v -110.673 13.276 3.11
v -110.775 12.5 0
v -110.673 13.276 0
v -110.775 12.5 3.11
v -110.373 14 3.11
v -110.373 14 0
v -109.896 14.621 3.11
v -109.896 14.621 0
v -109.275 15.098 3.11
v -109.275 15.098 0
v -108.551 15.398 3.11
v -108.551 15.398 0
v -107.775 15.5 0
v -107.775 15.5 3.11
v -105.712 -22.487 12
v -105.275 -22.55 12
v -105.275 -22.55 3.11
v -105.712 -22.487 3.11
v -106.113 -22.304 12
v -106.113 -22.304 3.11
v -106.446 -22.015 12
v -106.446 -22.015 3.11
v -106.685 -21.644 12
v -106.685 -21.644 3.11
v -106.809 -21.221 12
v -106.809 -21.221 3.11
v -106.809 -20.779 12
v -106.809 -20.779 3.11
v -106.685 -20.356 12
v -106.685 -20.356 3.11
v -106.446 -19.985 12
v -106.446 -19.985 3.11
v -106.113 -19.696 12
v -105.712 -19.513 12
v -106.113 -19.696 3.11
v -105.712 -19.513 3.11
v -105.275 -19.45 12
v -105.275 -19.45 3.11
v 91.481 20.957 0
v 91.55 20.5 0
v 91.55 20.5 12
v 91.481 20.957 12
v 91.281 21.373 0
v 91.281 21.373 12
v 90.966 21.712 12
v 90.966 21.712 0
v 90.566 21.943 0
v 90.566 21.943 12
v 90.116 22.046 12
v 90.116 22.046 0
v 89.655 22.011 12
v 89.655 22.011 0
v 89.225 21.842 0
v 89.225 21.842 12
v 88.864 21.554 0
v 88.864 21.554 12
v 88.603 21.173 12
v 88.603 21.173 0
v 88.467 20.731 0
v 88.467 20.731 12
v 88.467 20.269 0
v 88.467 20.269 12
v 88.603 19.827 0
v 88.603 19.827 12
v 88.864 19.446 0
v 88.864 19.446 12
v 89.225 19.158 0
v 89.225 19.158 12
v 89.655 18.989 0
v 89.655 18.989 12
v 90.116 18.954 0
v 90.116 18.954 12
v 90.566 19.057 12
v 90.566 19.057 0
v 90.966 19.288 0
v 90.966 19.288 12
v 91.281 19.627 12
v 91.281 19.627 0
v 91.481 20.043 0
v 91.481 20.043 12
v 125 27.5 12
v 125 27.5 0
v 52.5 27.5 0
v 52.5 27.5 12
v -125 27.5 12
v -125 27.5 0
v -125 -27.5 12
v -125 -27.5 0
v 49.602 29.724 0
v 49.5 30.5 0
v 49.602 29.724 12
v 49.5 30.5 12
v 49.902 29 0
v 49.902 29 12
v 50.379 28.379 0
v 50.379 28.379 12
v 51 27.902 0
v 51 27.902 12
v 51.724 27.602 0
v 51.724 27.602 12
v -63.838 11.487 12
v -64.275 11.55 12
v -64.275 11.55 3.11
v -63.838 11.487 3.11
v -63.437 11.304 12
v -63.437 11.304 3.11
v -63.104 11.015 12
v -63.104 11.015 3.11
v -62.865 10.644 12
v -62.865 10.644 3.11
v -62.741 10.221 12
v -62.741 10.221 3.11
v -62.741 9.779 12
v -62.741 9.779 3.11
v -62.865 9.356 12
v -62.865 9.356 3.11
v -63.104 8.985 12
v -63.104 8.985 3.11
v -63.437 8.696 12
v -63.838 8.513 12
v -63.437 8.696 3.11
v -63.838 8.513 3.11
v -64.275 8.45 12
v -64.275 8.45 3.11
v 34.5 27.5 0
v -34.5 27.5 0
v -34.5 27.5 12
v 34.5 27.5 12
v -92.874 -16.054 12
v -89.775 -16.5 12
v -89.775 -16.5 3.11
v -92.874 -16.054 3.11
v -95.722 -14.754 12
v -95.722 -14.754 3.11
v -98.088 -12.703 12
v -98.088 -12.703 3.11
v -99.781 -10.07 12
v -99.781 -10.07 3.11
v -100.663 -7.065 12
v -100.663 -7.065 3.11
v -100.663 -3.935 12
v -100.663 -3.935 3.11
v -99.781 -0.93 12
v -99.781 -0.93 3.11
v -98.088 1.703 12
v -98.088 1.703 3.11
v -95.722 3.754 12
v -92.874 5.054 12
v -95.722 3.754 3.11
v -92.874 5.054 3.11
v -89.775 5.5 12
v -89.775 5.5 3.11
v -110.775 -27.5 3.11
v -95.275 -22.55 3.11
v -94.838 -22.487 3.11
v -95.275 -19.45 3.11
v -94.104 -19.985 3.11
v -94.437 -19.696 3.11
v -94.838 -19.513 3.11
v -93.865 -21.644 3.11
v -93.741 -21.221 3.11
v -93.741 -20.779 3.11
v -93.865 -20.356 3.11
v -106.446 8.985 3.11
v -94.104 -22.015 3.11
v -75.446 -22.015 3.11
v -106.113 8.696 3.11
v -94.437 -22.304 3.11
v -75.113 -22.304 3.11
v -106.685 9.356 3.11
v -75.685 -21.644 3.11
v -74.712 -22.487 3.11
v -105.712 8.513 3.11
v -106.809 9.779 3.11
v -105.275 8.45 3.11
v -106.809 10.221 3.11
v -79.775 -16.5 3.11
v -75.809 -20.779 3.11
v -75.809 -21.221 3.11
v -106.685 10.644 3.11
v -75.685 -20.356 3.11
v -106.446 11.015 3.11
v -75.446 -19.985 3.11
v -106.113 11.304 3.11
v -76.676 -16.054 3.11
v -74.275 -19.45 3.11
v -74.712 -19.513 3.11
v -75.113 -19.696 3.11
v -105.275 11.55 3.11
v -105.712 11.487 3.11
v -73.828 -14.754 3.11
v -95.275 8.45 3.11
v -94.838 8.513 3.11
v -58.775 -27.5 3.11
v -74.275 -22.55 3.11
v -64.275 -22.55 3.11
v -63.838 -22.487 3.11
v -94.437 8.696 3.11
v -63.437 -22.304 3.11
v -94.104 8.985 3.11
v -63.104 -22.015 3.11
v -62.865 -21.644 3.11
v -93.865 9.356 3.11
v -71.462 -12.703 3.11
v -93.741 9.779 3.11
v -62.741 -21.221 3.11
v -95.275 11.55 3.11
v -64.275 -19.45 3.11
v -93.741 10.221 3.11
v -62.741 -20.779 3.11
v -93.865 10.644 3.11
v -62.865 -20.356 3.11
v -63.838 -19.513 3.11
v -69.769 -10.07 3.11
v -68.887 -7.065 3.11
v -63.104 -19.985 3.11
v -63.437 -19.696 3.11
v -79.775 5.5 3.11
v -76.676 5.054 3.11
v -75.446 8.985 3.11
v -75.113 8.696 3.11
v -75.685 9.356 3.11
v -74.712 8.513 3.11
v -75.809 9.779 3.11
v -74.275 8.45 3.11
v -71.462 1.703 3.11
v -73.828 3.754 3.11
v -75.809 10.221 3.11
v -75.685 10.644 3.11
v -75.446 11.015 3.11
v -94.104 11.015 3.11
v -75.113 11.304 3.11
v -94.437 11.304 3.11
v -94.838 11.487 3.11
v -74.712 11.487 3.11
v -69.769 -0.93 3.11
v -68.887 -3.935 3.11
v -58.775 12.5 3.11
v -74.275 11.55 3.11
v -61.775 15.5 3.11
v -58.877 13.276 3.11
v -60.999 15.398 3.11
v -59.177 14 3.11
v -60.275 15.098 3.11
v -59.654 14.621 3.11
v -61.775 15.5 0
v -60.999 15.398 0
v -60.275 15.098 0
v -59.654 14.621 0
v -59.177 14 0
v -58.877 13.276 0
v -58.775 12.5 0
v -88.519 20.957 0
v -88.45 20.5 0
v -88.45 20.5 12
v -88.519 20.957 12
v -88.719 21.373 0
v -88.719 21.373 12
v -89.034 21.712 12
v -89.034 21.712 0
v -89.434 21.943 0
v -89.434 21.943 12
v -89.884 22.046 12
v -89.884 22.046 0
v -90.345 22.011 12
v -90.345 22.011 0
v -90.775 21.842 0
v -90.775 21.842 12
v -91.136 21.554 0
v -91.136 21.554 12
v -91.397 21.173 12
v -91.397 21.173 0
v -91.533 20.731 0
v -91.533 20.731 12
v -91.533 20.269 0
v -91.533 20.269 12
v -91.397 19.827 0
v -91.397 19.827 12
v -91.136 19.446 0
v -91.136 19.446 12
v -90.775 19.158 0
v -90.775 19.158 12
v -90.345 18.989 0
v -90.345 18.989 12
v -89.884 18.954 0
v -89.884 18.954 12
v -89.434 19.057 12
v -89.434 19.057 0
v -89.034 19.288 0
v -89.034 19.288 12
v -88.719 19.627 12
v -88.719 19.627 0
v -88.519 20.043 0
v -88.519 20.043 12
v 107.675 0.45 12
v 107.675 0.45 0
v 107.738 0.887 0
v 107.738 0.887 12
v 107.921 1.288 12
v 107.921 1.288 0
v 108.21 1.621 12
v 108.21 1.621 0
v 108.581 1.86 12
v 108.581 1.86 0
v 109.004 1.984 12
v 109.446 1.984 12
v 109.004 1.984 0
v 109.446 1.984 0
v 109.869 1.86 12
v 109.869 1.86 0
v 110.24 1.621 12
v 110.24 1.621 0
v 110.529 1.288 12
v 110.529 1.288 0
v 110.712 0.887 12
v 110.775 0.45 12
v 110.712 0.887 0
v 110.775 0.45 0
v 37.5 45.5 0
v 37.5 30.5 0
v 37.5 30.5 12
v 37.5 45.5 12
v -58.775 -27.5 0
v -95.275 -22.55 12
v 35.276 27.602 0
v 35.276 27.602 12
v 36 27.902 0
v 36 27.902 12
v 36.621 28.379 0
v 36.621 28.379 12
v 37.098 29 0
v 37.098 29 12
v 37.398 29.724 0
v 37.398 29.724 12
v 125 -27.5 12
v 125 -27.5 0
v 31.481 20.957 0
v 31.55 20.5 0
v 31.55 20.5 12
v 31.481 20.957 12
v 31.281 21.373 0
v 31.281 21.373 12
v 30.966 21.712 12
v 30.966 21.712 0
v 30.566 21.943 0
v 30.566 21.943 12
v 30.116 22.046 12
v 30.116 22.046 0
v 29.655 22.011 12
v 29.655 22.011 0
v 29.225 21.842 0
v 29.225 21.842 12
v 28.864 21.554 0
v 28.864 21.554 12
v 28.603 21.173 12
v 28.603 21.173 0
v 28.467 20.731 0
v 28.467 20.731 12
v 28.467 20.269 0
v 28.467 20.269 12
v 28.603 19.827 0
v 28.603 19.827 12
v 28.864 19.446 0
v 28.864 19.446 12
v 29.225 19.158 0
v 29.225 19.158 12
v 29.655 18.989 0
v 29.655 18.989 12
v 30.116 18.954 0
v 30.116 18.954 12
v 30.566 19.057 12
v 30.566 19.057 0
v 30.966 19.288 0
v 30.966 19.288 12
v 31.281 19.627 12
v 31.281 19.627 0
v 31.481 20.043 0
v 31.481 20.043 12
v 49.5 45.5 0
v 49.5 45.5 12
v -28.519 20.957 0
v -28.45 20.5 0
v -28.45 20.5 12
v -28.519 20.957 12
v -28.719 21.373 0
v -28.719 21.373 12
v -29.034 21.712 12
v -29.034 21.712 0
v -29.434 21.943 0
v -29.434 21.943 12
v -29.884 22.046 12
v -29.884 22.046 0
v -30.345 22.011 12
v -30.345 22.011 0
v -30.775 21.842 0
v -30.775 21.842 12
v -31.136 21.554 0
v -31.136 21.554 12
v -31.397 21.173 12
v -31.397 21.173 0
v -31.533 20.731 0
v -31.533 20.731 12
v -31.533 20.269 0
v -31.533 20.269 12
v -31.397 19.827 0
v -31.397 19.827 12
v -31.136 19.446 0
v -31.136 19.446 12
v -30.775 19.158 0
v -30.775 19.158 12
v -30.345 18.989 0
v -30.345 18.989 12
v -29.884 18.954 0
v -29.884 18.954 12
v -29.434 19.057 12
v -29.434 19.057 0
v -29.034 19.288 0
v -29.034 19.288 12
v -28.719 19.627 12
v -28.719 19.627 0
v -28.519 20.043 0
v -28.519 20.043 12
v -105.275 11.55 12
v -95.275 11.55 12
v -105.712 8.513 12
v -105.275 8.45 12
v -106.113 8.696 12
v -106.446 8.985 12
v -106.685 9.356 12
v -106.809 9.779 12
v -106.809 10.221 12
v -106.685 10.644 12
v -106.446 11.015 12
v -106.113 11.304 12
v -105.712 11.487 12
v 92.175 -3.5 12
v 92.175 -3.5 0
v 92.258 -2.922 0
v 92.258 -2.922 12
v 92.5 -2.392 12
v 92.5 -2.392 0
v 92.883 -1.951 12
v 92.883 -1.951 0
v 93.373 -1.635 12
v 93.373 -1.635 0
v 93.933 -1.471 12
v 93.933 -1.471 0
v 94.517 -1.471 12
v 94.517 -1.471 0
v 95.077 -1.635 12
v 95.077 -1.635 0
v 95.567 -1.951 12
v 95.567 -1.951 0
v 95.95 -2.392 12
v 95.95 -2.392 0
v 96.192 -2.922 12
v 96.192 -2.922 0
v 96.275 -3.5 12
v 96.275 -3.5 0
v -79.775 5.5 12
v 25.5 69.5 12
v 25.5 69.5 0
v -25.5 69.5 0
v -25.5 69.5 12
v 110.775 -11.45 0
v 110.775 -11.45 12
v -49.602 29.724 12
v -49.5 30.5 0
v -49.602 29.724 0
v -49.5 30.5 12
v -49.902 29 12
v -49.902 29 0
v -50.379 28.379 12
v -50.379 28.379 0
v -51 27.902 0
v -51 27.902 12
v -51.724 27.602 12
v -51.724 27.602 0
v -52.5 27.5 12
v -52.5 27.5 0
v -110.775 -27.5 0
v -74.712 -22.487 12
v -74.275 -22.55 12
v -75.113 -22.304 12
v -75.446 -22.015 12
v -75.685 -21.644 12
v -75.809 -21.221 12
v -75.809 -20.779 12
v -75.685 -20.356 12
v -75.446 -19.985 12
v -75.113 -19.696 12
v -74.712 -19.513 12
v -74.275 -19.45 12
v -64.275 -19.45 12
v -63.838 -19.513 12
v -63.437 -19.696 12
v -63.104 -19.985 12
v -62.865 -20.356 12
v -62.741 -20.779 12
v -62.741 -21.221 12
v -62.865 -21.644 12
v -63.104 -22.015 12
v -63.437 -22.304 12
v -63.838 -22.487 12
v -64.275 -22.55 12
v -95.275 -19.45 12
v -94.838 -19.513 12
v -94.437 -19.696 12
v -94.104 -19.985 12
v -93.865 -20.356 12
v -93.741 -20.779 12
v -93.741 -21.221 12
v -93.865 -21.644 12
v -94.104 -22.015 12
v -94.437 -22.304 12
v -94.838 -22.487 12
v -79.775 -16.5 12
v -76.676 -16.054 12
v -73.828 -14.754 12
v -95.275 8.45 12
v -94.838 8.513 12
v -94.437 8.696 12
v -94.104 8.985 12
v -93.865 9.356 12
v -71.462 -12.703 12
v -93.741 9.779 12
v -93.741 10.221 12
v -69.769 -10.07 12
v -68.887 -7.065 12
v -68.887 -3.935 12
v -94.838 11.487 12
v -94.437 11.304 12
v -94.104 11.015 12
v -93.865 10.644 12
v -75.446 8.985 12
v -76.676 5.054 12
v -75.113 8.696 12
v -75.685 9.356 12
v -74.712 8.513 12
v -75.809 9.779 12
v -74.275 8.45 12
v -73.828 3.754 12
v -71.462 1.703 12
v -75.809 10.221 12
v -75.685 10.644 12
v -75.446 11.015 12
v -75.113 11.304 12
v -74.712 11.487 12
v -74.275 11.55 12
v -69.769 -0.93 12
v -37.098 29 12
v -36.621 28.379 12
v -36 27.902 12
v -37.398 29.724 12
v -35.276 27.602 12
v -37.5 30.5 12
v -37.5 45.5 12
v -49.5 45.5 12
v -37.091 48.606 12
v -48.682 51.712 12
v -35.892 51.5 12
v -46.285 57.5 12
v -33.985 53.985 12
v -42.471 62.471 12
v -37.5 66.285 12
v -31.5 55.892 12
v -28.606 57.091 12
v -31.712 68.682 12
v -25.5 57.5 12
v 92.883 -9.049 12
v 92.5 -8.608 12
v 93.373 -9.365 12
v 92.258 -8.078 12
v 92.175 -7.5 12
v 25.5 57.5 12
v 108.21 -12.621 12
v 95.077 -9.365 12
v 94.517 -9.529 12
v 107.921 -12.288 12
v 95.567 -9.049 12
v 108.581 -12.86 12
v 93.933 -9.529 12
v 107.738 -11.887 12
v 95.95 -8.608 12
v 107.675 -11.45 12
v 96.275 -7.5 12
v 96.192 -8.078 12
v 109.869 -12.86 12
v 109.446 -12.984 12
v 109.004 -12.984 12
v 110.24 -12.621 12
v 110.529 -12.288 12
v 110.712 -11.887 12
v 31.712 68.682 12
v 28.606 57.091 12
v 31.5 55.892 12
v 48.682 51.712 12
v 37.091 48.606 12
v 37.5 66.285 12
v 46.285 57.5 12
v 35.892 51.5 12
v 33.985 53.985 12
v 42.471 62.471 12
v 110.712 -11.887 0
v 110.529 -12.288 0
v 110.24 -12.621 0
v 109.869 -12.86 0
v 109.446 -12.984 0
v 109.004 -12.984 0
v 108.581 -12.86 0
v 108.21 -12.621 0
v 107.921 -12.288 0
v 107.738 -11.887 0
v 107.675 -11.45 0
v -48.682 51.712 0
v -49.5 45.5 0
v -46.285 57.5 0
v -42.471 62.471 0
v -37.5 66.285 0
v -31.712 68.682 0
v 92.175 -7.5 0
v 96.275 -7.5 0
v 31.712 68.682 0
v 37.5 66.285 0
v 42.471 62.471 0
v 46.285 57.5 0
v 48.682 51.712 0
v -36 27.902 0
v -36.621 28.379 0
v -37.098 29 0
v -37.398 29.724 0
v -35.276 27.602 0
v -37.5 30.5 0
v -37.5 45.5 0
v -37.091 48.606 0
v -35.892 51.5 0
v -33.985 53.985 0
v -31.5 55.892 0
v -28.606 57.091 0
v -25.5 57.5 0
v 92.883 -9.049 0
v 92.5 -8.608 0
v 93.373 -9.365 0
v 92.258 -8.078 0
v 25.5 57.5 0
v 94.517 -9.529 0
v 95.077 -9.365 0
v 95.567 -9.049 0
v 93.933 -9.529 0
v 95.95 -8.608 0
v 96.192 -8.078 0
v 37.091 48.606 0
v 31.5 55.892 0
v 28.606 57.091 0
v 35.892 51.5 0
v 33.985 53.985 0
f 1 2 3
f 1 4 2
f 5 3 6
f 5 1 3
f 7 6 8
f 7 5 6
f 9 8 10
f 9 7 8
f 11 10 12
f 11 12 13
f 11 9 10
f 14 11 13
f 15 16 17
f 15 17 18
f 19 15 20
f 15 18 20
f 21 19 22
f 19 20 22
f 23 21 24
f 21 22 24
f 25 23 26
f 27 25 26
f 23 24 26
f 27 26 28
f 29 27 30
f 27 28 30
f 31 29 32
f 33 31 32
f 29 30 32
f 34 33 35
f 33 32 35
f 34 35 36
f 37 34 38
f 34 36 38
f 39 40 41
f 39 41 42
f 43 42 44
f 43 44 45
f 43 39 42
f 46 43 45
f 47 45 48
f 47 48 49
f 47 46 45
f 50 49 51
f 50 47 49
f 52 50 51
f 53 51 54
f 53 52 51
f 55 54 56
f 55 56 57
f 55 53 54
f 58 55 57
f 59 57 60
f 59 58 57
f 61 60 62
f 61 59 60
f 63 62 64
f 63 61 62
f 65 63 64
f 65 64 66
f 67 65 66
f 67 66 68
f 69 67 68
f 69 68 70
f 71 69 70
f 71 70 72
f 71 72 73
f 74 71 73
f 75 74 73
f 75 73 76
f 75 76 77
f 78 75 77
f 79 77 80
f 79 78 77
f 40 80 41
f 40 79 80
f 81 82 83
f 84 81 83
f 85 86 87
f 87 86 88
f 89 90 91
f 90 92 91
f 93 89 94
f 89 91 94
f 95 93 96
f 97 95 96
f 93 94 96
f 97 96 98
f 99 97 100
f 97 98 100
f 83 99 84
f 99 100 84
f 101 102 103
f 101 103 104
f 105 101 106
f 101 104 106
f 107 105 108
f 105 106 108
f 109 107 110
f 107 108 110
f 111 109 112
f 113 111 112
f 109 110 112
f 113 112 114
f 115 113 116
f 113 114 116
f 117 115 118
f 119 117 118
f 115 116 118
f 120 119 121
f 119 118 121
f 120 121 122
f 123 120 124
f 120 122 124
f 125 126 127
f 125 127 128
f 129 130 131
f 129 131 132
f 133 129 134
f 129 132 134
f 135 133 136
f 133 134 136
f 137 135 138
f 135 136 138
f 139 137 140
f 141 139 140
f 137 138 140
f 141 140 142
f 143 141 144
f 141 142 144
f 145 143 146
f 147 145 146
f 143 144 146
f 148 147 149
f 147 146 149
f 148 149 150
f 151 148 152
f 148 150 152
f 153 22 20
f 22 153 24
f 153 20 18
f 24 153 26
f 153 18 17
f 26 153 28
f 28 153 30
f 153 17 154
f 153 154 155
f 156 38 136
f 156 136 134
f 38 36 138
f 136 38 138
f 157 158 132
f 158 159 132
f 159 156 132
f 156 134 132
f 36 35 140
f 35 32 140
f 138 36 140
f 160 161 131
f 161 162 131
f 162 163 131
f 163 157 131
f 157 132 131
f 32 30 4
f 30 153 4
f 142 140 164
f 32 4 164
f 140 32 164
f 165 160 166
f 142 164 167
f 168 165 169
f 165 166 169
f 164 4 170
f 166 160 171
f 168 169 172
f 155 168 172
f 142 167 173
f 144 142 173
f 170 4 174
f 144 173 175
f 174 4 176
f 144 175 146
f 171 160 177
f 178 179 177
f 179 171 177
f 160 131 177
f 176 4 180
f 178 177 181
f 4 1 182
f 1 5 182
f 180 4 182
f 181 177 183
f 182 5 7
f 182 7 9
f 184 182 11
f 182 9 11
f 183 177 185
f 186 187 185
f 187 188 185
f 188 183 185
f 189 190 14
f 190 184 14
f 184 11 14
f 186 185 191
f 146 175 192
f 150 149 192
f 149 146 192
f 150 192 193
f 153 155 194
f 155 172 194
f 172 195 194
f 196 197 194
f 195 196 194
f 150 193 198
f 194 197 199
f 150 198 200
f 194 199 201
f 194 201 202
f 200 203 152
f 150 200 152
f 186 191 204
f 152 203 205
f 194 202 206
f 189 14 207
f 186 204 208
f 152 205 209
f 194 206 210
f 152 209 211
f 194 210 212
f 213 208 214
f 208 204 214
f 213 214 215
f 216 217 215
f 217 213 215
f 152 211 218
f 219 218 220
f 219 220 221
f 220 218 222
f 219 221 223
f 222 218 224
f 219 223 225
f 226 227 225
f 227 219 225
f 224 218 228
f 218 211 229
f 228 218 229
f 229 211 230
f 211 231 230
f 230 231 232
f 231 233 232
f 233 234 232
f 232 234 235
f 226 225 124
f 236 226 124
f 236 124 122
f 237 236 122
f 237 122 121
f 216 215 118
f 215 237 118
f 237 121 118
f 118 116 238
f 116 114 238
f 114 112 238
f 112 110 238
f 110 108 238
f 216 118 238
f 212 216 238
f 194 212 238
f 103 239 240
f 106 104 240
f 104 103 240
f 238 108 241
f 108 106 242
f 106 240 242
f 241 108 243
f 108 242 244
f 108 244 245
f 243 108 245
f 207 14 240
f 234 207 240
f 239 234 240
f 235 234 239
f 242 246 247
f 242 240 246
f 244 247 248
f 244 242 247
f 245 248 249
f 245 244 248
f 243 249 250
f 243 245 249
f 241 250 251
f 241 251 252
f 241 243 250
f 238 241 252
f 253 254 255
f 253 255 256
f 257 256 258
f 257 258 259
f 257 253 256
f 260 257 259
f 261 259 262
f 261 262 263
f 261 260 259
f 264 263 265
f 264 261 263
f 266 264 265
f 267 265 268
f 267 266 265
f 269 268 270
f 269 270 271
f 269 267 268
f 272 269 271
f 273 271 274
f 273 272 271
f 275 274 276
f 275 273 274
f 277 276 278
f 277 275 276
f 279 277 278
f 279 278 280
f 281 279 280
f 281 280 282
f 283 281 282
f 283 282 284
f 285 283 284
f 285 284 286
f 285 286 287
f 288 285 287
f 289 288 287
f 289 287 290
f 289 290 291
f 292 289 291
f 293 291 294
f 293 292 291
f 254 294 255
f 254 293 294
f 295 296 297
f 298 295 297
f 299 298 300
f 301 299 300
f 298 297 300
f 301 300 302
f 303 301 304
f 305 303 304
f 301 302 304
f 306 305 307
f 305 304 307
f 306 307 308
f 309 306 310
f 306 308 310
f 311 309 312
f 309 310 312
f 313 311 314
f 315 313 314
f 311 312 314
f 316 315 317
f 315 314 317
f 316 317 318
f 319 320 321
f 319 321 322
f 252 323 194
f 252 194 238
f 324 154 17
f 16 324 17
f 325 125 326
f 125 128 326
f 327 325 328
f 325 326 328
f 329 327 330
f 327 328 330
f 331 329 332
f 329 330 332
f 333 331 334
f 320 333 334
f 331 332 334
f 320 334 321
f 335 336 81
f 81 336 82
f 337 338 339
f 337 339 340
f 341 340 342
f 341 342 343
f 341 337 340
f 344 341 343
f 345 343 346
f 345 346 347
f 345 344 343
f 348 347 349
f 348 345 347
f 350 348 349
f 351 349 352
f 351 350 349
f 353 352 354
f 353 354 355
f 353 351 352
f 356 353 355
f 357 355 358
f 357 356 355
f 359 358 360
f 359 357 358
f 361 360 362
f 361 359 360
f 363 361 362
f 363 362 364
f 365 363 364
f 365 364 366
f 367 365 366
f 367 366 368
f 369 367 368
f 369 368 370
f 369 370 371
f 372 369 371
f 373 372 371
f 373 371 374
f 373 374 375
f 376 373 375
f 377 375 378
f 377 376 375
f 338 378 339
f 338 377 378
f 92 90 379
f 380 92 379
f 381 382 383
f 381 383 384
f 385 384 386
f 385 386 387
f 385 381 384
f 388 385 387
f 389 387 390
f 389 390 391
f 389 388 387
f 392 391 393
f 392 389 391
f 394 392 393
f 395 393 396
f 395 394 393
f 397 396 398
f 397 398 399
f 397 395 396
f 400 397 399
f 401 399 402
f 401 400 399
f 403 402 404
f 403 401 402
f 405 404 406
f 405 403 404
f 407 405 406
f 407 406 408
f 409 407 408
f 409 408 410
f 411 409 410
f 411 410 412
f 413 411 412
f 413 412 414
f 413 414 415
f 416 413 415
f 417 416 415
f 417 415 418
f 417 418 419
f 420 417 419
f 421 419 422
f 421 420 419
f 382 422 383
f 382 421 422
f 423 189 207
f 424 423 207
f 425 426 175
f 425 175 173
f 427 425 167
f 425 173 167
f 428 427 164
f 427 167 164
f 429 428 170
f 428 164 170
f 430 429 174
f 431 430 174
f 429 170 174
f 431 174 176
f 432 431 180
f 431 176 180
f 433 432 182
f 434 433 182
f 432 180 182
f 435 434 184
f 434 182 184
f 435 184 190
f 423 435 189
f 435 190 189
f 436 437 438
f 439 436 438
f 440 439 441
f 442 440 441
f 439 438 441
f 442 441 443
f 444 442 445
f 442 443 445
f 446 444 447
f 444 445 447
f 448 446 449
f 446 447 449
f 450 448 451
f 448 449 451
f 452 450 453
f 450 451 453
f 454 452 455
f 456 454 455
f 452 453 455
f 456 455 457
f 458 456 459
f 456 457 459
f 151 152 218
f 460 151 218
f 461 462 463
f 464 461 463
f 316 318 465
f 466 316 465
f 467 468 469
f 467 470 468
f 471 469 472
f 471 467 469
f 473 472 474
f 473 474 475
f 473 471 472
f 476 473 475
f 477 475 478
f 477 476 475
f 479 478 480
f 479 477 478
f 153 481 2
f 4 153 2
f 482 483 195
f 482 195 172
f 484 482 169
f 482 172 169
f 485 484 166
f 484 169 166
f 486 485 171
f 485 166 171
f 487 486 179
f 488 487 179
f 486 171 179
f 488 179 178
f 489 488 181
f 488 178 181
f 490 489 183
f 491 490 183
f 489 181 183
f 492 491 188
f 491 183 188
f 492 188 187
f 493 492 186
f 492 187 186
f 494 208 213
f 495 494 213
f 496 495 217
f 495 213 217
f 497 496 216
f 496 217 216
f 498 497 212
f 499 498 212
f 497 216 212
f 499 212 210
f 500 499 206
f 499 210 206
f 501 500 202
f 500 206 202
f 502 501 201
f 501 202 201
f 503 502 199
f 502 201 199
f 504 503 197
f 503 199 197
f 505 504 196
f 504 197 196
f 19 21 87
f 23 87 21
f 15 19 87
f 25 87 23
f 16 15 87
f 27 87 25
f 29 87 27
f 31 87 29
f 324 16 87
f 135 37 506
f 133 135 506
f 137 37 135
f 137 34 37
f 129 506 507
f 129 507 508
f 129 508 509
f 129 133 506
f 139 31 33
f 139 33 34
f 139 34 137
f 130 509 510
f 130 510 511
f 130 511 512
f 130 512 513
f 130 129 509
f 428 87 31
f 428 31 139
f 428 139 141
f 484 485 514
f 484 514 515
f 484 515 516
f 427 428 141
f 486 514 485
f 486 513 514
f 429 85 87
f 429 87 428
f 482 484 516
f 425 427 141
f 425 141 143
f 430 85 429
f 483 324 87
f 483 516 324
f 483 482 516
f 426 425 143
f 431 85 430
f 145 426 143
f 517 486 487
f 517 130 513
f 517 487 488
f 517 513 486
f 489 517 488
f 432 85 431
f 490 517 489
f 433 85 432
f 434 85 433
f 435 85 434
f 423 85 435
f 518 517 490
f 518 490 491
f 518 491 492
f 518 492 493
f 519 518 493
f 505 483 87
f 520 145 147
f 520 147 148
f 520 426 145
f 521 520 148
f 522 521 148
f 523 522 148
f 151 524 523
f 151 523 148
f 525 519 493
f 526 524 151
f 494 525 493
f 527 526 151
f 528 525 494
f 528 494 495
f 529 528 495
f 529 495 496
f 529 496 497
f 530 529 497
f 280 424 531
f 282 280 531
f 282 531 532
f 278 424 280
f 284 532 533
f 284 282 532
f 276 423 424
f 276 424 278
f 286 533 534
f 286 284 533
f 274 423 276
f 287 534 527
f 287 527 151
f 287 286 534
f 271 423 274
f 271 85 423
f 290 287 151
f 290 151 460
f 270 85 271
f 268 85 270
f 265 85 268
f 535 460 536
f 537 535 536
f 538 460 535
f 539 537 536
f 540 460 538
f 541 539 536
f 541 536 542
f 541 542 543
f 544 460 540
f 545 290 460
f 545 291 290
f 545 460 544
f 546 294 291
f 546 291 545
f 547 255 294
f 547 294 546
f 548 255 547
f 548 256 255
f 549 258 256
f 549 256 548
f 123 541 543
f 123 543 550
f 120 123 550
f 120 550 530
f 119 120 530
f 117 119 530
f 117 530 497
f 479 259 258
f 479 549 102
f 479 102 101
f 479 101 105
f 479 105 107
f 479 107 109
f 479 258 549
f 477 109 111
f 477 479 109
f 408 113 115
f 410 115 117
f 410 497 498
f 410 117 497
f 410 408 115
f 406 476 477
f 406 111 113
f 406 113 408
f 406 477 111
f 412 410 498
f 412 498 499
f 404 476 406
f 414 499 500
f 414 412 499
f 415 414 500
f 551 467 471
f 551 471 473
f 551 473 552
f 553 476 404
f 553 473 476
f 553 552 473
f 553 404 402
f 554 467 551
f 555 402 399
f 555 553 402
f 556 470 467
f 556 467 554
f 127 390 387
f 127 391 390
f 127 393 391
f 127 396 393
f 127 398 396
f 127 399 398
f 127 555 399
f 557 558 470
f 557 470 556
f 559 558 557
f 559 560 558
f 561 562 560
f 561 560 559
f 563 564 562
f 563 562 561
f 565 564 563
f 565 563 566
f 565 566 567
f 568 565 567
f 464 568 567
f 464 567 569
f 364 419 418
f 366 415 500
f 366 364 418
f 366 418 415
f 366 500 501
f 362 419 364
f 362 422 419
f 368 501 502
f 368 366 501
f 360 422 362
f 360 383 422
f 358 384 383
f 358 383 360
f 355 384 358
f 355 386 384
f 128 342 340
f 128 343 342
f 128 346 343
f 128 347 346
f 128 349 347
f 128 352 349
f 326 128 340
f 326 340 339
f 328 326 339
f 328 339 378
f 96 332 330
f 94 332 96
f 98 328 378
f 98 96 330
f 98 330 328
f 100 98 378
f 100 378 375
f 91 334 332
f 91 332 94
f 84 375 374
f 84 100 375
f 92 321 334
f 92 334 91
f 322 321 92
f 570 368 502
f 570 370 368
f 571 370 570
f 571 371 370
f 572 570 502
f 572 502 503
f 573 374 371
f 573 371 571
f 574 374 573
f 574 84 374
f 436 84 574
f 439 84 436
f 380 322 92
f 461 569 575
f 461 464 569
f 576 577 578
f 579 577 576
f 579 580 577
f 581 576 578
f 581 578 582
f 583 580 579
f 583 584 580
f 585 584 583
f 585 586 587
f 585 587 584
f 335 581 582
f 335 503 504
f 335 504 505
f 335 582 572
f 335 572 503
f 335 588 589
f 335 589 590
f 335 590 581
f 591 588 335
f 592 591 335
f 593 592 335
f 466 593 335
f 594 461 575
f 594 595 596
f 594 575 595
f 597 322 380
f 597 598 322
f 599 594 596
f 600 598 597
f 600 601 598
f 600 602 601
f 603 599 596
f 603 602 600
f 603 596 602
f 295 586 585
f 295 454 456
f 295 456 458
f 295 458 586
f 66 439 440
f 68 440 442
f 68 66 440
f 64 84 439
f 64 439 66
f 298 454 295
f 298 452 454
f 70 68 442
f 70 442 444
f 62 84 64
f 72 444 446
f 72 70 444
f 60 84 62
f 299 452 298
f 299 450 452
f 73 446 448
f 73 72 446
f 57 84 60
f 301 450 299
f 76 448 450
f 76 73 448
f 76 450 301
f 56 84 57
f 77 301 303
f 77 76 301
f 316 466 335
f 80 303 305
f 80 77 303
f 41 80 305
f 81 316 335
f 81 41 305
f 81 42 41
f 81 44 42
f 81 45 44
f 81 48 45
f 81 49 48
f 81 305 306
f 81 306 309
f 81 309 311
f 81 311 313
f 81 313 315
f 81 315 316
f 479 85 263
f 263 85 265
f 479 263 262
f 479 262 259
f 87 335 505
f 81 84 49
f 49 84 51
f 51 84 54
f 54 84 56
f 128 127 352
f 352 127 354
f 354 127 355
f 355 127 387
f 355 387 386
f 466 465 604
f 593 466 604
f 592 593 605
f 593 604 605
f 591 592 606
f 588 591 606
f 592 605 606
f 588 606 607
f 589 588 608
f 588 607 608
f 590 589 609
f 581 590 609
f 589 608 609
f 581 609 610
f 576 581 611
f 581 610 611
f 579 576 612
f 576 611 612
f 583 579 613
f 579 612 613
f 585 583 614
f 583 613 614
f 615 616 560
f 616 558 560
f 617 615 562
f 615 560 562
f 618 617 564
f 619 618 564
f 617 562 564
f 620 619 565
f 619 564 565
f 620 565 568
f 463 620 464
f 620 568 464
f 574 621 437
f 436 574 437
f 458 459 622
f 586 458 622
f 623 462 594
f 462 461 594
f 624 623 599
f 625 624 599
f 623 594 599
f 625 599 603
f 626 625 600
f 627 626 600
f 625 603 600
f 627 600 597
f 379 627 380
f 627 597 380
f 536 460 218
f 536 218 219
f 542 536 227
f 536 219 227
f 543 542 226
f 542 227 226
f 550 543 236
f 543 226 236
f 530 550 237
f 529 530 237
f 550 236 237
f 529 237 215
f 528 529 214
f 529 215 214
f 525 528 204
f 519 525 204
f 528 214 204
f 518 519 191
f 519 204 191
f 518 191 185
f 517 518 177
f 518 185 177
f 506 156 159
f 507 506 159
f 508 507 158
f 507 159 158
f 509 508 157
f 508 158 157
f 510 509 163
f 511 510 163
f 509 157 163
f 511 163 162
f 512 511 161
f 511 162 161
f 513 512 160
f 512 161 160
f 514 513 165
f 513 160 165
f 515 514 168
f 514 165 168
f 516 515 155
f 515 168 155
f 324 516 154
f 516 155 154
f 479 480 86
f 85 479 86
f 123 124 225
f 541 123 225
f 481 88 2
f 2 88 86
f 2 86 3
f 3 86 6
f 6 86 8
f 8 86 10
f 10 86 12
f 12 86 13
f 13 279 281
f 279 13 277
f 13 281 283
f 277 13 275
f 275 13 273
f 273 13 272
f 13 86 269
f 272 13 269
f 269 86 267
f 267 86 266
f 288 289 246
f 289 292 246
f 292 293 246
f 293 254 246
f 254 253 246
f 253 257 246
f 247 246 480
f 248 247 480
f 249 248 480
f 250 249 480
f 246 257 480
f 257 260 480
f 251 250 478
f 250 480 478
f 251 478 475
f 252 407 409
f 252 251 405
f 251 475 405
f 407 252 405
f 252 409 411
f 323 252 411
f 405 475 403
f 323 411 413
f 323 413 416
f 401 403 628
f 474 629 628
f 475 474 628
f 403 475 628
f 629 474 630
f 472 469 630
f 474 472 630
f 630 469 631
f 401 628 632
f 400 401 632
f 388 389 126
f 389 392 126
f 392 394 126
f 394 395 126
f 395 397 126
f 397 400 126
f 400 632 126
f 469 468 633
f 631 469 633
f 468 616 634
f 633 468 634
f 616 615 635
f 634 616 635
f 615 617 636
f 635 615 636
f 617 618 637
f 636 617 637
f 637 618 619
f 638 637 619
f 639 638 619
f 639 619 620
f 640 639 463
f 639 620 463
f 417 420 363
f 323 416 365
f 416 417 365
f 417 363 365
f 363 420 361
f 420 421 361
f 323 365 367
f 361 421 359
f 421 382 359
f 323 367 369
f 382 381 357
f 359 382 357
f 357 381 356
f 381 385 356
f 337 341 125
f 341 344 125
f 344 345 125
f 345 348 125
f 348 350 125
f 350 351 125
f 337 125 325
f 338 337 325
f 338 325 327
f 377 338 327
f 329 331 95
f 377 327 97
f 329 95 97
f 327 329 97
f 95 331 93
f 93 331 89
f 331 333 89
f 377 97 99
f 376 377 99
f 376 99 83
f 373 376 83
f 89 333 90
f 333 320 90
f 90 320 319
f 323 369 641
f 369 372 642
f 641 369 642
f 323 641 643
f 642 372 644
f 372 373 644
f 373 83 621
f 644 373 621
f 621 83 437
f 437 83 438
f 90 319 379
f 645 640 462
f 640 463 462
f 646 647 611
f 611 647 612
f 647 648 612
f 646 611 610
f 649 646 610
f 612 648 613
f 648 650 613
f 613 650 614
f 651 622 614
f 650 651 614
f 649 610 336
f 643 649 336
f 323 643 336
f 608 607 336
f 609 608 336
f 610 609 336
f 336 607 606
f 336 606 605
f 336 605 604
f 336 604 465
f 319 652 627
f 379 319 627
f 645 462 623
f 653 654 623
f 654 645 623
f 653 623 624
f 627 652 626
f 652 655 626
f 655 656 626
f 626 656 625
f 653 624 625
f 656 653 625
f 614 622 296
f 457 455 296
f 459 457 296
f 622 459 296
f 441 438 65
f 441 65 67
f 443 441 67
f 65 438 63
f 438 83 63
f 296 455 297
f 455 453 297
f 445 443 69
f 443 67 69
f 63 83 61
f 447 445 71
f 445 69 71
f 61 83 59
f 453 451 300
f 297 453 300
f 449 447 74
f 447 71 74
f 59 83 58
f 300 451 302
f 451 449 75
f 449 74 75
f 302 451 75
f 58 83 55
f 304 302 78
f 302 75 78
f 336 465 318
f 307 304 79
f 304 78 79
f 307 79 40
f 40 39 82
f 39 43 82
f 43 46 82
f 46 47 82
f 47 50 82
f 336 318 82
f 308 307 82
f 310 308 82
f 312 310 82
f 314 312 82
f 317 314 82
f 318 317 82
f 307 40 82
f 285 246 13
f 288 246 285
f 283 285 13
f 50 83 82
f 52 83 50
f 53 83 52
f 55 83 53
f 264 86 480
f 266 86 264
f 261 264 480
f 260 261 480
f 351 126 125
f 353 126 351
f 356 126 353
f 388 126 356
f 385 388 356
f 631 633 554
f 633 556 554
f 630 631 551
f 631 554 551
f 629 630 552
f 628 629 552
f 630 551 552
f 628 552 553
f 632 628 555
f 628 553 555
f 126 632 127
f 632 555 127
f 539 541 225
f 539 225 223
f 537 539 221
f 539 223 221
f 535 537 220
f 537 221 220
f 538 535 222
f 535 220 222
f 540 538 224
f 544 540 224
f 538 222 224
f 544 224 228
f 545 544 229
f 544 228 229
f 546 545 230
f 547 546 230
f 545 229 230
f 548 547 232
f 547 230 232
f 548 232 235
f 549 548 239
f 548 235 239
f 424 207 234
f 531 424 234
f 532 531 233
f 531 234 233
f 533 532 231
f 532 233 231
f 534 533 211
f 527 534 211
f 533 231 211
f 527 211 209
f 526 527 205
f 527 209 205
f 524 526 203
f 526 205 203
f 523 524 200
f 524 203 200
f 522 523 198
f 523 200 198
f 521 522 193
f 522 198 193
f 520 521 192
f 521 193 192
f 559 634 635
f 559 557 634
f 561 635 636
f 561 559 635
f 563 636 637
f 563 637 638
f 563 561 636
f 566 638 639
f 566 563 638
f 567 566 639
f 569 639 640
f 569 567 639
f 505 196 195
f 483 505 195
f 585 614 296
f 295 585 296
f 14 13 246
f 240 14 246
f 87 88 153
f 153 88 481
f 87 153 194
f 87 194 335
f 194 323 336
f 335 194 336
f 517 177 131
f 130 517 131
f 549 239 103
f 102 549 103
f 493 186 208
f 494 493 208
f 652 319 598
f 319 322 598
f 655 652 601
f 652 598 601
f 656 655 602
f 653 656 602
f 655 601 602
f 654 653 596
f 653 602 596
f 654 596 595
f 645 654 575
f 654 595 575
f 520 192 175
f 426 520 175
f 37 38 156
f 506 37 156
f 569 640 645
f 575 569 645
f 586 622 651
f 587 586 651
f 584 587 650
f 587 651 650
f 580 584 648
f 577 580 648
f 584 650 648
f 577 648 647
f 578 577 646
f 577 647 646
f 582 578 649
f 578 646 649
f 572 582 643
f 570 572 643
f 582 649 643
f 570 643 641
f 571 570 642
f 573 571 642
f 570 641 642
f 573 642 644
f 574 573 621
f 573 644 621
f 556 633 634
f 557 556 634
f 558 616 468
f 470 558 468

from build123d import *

# Parameters (mm, degrees)
SKIZZE2_R                       = 1.55
SKIZZE2_W                       = 75
SKIZZE2_H                       = 30
AUFSATZ_LINEAR_AUSTRAGEN1_DEPTH = 12
SKIZZE2_3_W                     = 52
SKIZZE2_3_H                     = 43
SCHNITT_LINEAR_AUSTRAGEN1_DEPTH = 3.11
VERRUNDUNG1_R                   = 12
VERRUNDUNG2_R                   = 24
VERRUNDUNG3_R                   = 3
VERRUNDUNG4_R                   = 3


with BuildPart() as part:
    # Skizze2 → Aufsatz-Linear austragen1 (new body)
    with BuildSketch(Plane.XY):
        Polygon((-125, 27.5), (-125, -27.5), (125, -27.5), (125, 27.5), (49.5, 27.5), (49.5, 69.5), (-49.5, 69.5), (-49.5, 27.5), align=None)
        with Locations((-90, 20.5)):
            Circle(SKIZZE2_R, mode=Mode.SUBTRACT)
        with Locations((-30, 20.5)):
            Circle(SKIZZE2_R, mode=Mode.SUBTRACT)
        with BuildLine():
            ThreePointArc((92.175, -3.5), (94.225, -1.45), (96.275, -3.5))
            Line((96.275, -3.5), (96.275, -7.5))
            ThreePointArc((96.275, -7.5), (94.225, -9.55), (92.175, -7.5))
            Line((92.175, -7.5), (92.175, -3.5))
        make_face(mode=Mode.SUBTRACT)
        with BuildLine():
            ThreePointArc((107.675, 0.45), (109.225, 2), (110.775, 0.45))
            Line((110.775, 0.45), (110.775, -11.45))
            ThreePointArc((110.775, -11.45), (109.225, -13), (107.675, -11.45))
            Line((107.675, -11.45), (107.675, 0.45))
        make_face(mode=Mode.SUBTRACT)
        with Locations((30, 20.5)):
            Circle(SKIZZE2_R, mode=Mode.SUBTRACT)
        with Locations((90, 20.5)):
            Circle(SKIZZE2_R, mode=Mode.SUBTRACT)
        with Locations((0, 42.5)):
            Rectangle(SKIZZE2_W, SKIZZE2_H, mode=Mode.SUBTRACT)
        with BuildLine():
            Line((-74.275, 11.55), (-64.275, 11.55))
            ThreePointArc((-64.275, 11.55), (-62.725, 10), (-64.275, 8.45))
            Line((-64.275, 8.45), (-74.275, 8.45))
            ThreePointArc((-74.275, 8.45), (-75.825, 10), (-74.275, 11.55))
        make_face(mode=Mode.SUBTRACT)
        with BuildLine():
            ThreePointArc((-105.275, -22.55), (-106.825, -21), (-105.275, -19.45))
            Line((-105.275, -19.45), (-95.275, -19.45))
            ThreePointArc((-95.275, -19.45), (-93.725, -21), (-95.275, -22.55))
            Line((-95.275, -22.55), (-105.275, -22.55))
        make_face(mode=Mode.SUBTRACT)
        with BuildLine():
            ThreePointArc((-64.275, -19.45), (-62.725, -21), (-64.275, -22.55))
            Line((-64.275, -22.55), (-74.275, -22.55))
            ThreePointArc((-74.275, -22.55), (-75.825, -21), (-74.275, -19.45))
            Line((-74.275, -19.45), (-64.275, -19.45))
        make_face(mode=Mode.SUBTRACT)
        with BuildLine():
            ThreePointArc((-79.775, 5.5), (-68.775, -5.5), (-79.775, -16.5))
            Line((-79.775, -16.5), (-89.775, -16.5))
            ThreePointArc((-89.775, -16.5), (-100.775, -5.5), (-89.775, 5.5))
            Line((-89.775, 5.5), (-79.775, 5.5))
        make_face(mode=Mode.SUBTRACT)
        with BuildLine():
            ThreePointArc((-105.275, 8.45), (-106.825, 10), (-105.275, 11.55))
            Line((-105.275, 11.55), (-95.275, 11.55))
            ThreePointArc((-95.275, 11.55), (-93.725, 10), (-95.275, 8.45))
            Line((-95.275, 8.45), (-105.275, 8.45))
        make_face(mode=Mode.SUBTRACT)
    extrude(amount=AUFSATZ_LINEAR_AUSTRAGEN1_DEPTH)

    # Skizze2<3> → Schnitt-Linear austragen1 (cut)
    with BuildSketch(Plane.XY):
        with Locations((-84.775, -6)):
            Rectangle(SKIZZE2_3_W, SKIZZE2_3_H)
        with BuildLine():
            ThreePointArc((-105.275, -22.55), (-106.825, -21), (-105.275, -19.45))
            Line((-105.275, -19.45), (-95.275, -19.45))
            ThreePointArc((-95.275, -19.45), (-93.725, -21), (-95.275, -22.55))
            Line((-95.275, -22.55), (-105.275, -22.55))
        make_face(mode=Mode.SUBTRACT)
        with BuildLine():
            ThreePointArc((-64.275, -19.45), (-62.725, -21), (-64.275, -22.55))
            Line((-64.275, -22.55), (-74.275, -22.55))
            ThreePointArc((-74.275, -22.55), (-75.825, -21), (-74.275, -19.45))
            Line((-74.275, -19.45), (-64.275, -19.45))
        make_face(mode=Mode.SUBTRACT)
        with BuildLine():
            ThreePointArc((-79.775, 5.5), (-68.775, -5.5), (-79.775, -16.5))
            Line((-79.775, -16.5), (-89.775, -16.5))
            ThreePointArc((-89.775, -16.5), (-100.775, -5.5), (-89.775, 5.5))
            Line((-89.775, 5.5), (-79.775, 5.5))
        make_face(mode=Mode.SUBTRACT)
        with BuildLine():
            ThreePointArc((-105.275, 8.45), (-106.825, 10), (-105.275, 11.55))
            Line((-105.275, 11.55), (-95.275, 11.55))
            ThreePointArc((-95.275, 11.55), (-93.725, 10), (-95.275, 8.45))
            Line((-95.275, 8.45), (-105.275, 8.45))
        make_face(mode=Mode.SUBTRACT)
        with BuildLine():
            ThreePointArc((-64.275, 11.55), (-62.725, 10), (-64.275, 8.45))
            Line((-64.275, 8.45), (-74.275, 8.45))
            ThreePointArc((-74.275, 8.45), (-75.825, 10), (-74.275, 11.55))
            Line((-74.275, 11.55), (-64.275, 11.55))
        make_face(mode=Mode.SUBTRACT)
    extrude(amount=SCHNITT_LINEAR_AUSTRAGEN1_DEPTH, mode=Mode.SUBTRACT)

    # Verrundung1
    verrundung1_edges = [part.edges().sort_by_distance(p)[0] for p in [
        (37.5, 57.5, 6),
        (-37.5, 57.5, 6),
    ]]
    fillet(verrundung1_edges, radius=VERRUNDUNG1_R)

    # Verrundung2
    verrundung2_edges = [part.edges().sort_by_distance(p)[0] for p in [
        (49.5, 69.5, 6),
        (-49.5, 69.5, 6),
    ]]
    fillet(verrundung2_edges, radius=VERRUNDUNG2_R)

    # Verrundung3
    verrundung3_edges = [part.edges().sort_by_distance(p)[0] for p in [
        (49.5, 27.5, 6),
        (-37.5, 27.5, 6),
        (37.5, 27.5, 6),
        (-49.5, 27.5, 6),
    ]]
    fillet(verrundung3_edges, radius=VERRUNDUNG3_R)

    # Verrundung4
    verrundung4_edges = [part.edges().sort_by_distance(p)[0] for p in [
        (-110.775, 15.5, 1.555),
        (-58.775, 15.5, 1.555),
    ]]
    fillet(verrundung4_edges, radius=VERRUNDUNG4_R)


solid = part.part
